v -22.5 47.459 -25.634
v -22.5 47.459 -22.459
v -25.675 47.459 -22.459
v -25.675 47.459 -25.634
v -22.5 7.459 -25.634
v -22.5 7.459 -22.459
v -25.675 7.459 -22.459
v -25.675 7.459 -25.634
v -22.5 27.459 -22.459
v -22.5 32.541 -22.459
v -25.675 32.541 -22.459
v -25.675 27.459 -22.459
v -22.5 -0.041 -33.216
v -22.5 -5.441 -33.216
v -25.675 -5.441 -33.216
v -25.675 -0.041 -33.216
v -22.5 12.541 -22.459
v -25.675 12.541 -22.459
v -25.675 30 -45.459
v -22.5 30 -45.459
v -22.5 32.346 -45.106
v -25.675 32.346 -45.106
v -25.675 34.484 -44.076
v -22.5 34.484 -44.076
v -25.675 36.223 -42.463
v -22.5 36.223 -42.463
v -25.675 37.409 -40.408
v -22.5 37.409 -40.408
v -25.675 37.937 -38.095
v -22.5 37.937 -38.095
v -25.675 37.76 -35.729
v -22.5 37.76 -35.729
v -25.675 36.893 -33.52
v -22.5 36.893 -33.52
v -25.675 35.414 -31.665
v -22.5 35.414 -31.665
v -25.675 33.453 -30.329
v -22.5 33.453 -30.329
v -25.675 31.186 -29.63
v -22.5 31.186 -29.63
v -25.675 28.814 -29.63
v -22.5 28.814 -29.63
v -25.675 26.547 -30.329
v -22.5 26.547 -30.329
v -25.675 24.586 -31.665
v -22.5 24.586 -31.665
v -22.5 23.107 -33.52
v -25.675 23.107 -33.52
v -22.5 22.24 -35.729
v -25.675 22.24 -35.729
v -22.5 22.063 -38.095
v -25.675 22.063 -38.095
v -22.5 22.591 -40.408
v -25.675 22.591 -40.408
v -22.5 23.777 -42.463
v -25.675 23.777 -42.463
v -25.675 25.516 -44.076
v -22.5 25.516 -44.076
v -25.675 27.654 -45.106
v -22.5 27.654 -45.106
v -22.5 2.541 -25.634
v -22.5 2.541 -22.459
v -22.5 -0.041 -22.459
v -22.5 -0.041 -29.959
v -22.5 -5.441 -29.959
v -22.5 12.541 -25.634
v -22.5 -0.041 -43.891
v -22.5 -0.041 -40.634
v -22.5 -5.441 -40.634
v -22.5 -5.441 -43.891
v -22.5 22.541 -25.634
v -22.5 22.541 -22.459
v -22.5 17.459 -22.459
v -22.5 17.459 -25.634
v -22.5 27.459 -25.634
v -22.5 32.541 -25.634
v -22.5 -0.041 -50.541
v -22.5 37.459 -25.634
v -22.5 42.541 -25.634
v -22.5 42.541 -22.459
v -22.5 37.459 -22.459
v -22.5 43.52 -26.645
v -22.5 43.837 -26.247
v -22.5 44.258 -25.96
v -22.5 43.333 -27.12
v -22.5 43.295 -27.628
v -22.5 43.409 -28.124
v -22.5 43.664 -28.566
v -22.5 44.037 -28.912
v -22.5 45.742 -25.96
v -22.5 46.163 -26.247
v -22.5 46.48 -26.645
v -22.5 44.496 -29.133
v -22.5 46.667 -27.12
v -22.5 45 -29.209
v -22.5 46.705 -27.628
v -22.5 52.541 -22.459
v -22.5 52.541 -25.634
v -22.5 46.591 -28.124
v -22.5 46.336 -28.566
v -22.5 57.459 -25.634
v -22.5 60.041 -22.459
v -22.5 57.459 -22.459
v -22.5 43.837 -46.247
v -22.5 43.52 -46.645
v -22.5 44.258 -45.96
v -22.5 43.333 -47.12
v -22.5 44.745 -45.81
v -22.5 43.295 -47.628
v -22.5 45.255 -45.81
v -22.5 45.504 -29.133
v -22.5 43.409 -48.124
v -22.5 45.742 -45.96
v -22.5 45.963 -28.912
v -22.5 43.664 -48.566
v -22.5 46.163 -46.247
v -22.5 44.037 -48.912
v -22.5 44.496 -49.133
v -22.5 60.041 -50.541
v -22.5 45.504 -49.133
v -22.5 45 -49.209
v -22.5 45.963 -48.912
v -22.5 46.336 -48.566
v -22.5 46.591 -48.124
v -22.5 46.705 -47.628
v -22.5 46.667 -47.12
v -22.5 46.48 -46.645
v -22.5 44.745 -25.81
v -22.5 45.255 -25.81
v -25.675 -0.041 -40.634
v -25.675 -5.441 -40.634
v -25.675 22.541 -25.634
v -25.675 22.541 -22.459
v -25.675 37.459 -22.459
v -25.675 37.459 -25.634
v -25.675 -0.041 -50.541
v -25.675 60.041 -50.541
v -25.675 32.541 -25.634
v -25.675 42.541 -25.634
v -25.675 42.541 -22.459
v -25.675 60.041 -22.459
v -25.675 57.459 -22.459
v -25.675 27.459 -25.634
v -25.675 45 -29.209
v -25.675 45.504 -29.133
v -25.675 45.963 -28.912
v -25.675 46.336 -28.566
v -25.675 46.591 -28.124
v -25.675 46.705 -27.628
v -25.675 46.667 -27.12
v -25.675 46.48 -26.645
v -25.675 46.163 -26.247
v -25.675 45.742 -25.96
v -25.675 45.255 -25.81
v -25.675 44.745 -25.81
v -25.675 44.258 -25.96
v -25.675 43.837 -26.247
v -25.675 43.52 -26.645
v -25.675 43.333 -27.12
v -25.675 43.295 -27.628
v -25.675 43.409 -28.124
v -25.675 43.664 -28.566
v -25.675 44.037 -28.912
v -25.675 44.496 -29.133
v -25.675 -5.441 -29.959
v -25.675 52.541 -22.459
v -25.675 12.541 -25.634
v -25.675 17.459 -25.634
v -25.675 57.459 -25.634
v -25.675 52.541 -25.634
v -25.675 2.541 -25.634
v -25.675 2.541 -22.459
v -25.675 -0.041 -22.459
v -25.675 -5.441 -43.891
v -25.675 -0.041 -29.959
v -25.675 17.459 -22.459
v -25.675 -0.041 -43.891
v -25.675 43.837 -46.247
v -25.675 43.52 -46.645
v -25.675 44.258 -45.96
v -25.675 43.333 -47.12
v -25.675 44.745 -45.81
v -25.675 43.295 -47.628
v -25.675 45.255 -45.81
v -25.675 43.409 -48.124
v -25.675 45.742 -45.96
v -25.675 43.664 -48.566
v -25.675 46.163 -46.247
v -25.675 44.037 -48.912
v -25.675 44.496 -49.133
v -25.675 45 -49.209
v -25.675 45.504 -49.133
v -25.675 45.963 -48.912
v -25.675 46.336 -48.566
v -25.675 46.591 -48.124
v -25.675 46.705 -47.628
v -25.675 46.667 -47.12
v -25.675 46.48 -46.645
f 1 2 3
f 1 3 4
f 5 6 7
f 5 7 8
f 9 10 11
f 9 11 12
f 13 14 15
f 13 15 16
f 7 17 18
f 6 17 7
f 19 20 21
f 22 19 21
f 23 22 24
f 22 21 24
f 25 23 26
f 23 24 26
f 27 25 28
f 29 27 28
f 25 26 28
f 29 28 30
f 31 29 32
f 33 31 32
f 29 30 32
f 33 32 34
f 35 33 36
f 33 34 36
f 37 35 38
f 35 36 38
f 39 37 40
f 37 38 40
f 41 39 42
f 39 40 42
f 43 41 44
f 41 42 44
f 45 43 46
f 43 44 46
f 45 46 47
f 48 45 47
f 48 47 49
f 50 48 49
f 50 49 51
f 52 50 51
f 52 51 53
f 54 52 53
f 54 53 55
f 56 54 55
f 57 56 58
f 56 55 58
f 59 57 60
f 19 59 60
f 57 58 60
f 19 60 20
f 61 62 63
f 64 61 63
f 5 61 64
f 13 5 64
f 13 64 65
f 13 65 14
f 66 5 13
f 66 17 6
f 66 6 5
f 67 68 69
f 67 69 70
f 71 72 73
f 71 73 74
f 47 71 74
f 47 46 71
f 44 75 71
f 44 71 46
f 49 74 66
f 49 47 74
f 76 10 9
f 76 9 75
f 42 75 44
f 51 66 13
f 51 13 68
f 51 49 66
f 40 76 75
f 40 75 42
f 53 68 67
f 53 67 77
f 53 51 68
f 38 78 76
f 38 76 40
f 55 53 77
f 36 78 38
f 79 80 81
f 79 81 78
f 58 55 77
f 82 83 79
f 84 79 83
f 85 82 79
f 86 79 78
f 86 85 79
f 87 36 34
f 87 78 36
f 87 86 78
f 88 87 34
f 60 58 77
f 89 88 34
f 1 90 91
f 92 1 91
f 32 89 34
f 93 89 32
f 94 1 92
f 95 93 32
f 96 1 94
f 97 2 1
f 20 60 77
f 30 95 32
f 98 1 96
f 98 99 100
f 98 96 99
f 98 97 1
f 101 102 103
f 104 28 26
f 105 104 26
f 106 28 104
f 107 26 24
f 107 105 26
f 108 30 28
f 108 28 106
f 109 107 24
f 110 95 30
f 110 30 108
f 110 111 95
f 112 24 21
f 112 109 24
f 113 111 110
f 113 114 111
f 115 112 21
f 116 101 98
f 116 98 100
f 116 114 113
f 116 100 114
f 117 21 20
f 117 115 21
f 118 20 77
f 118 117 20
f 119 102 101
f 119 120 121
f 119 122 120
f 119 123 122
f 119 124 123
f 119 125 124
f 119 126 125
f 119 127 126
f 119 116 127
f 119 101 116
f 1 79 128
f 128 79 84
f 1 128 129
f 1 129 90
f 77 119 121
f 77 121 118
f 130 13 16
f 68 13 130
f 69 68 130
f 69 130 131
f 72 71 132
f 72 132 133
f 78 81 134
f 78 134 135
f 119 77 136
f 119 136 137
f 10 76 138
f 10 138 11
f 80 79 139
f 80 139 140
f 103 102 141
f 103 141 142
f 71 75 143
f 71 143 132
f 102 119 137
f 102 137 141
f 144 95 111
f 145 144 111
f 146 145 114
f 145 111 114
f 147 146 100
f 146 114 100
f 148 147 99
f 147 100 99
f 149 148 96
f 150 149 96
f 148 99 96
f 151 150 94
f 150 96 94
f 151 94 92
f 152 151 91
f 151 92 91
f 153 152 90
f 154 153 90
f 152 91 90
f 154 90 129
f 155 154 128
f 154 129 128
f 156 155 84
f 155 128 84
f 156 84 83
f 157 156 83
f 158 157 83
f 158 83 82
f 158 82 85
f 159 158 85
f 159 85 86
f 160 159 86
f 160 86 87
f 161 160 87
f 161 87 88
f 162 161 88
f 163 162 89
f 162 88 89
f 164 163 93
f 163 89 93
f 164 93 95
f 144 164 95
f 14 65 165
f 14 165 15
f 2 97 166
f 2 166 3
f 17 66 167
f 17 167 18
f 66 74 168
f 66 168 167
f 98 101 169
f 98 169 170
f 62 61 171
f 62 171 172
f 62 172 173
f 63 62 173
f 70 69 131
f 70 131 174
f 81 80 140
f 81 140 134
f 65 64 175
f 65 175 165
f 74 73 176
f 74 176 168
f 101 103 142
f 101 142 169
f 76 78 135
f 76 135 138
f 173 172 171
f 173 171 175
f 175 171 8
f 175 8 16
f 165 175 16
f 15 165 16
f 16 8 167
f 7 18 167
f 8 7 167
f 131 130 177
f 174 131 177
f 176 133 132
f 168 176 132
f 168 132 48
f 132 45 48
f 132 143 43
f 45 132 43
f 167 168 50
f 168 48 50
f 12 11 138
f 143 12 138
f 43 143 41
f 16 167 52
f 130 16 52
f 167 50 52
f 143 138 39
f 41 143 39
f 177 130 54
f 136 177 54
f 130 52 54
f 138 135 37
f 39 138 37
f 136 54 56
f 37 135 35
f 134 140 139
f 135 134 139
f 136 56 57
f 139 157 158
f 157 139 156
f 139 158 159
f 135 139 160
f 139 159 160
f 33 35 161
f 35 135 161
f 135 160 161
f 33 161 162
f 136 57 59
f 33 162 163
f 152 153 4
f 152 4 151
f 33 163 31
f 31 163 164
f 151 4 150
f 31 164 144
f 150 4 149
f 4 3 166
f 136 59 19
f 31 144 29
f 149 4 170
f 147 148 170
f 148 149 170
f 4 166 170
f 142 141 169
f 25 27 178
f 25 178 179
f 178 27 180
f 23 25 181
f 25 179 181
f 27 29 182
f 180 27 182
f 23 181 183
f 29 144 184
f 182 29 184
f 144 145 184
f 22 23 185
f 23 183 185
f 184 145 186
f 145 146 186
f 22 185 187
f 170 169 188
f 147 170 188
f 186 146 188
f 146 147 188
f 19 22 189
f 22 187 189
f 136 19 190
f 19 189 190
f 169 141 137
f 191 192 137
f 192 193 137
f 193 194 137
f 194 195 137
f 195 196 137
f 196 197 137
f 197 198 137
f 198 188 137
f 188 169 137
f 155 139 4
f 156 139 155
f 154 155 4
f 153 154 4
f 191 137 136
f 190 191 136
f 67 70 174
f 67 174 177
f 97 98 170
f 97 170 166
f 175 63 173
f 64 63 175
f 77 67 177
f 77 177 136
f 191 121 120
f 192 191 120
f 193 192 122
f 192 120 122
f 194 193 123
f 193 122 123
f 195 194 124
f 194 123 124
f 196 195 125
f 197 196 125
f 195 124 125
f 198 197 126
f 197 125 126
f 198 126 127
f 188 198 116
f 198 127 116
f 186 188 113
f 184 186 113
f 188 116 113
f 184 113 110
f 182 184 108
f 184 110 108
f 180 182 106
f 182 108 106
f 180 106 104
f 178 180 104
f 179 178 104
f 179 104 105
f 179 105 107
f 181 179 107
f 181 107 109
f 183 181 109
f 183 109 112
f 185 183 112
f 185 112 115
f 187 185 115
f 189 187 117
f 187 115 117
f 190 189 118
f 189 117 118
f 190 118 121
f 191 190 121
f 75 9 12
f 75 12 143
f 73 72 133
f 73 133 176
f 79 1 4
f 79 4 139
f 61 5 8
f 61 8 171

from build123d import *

# Parameters (mm, degrees)
SKETCH1_W           = 24.825
SKETCH1_H           = 3.175
SKETCH1_W_2         = 3.175
SKETCH1_H_2         = 24.825
BOSS_EXTRUDE1_DEPTH = 60
SKETCH2_W           = 3.125
SKETCH2_H           = 5.4
BOSS_EXTRUDE4_DEPTH = 3.175
SKETCH4_R           = 8
CUT_EXTRUDE1_DEPTH  = 3.175
SKETCH3_R           = 8
CUT_EXTRUDE2_DEPTH  = 3.175
SKETCH5_W           = 3.175
SKETCH5_H           = 5.4
BOSS_EXTRUDE5_DEPTH = 3.175
SKETCH6_R           = 1.75
CUT_EXTRUDE3_DEPTH  = 10
SKETCH7_R           = 1.75
CUT_EXTRUDE4_DEPTH  = 10
SKETCH9_W           = 3.175
SKETCH9_H           = 65.4
CUT_EXTRUDE5_DEPTH  = 24.825
SKETCH10_W          = 3.175
SKETCH10_H          = 5
CUT_EXTRUDE6_DEPTH  = 10
SKETCH11_R          = 7.95936
SKETCH11_R_2        = 1.70936
BOSS_EXTRUDE6_DEPTH = 3.175


with BuildPart() as part:
    # Sketch1 → Boss-Extrude1 (new body)
    with BuildSketch(Plane(origin=(0, 0, 0), x_dir=(1, 0, 0), z_dir=(0, 1, 0))):
        with Locations((-38.0875, 24.0875)):
            Rectangle(SKETCH1_W, SKETCH1_H)
        with Locations((-24.0875, 24.0875)):
            Rectangle(SKETCH1_W_2, SKETCH1_H)
        with Locations((-24.0875, 38.0875)):
            Rectangle(SKETCH1_W_2, SKETCH1_H_2)
    extrude(amount=BOSS_EXTRUDE1_DEPTH)

    # Sketch2 → Boss-Extrude4 (add)
    with BuildSketch(Plane.XY.offset(-22.5)):
        with Locations((-42.1875, -2.7)):
            Rectangle(SKETCH2_W, SKETCH2_H)
        with Locations((-31.5625, -2.7)):
            Rectangle(SKETCH2_W, SKETCH2_H)
    extrude(amount=-BOSS_EXTRUDE4_DEPTH)

    # Sketch4 → Cut-Extrude1 (cut)
    with BuildSketch(Plane.XY.offset(-22.5)):
        with Locations((-37.5, 30)):
            Circle(SKETCH4_R)
    extrude(amount=-CUT_EXTRUDE1_DEPTH, mode=Mode.SUBTRACT)

    # Sketch3 → Cut-Extrude2 (cut)
    with BuildSketch(Plane(origin=(-22.5, 0, 0), x_dir=(0, 0, -1), z_dir=(1, 0, 0))):
        with Locations((37.5, 30)):
            Circle(SKETCH3_R)
    extrude(amount=-CUT_EXTRUDE2_DEPTH, mode=Mode.SUBTRACT)

    # Sketch5 → Boss-Extrude5 (add)
    with BuildSketch(Plane(origin=(-22.5, 0, 0), x_dir=(0, 0, -1), z_dir=(1, 0, 0))):
        with Locations((42.2625, -2.7)):
            Rectangle(SKETCH5_W, SKETCH5_H)
        with Locations((31.5875, -2.7)):
            Rectangle(SKETCH5_W, SKETCH5_H)
    extrude(amount=-BOSS_EXTRUDE5_DEPTH)

    # Sketch6 → Cut-Extrude3 (cut)
    with BuildSketch(Plane.XY.offset(-22.5)):
        with Locations((-47.5, 45)):
            Circle(SKETCH6_R)
        with Locations((-27.5, 45)):
            Circle(SKETCH6_R)
    extrude(amount=-CUT_EXTRUDE3_DEPTH, mode=Mode.SUBTRACT)

    # Sketch7 → Cut-Extrude4 (cut)
    with BuildSketch(Plane(origin=(-22.5, 0, 0), x_dir=(0, 0, -1), z_dir=(1, 0, 0))):
        with Locations((47.5, 45)):
            Circle(SKETCH7_R)
        with Locations((27.5, 45)):
            Circle(SKETCH7_R)
    extrude(amount=-CUT_EXTRUDE4_DEPTH, mode=Mode.SUBTRACT)

    # Sketch9 → Cut-Extrude5 (cut)
    with BuildSketch(Plane.ZY.offset(50.5)):
        with Locations((-24.0875, 27.3)):
            Rectangle(SKETCH9_W, SKETCH9_H)
    extrude(amount=-CUT_EXTRUDE5_DEPTH, mode=Mode.SUBTRACT)

    # Sketch10 → Cut-Extrude6 (cut)
    with BuildSketch(Plane.ZY.offset(25.675)):
        with Locations((-24.0875, 55)):
            Rectangle(SKETCH10_W, SKETCH10_H)
        with Locations((-24.0875, 45)):
            Rectangle(SKETCH10_W, SKETCH10_H)
        with Locations((-24.0875, 35)):
            Rectangle(SKETCH10_W, SKETCH10_H)
        with Locations((-24.0875, 25)):
            Rectangle(SKETCH10_W, SKETCH10_H)
        with Locations((-24.0875, 15)):
            Rectangle(SKETCH10_W, SKETCH10_H)
        with Locations((-24.0875, 5)):
            Rectangle(SKETCH10_W, SKETCH10_H)
    extrude(amount=-CUT_EXTRUDE6_DEPTH, mode=Mode.SUBTRACT)

    # Sketch11 → Boss-Extrude6 (add)
    with BuildSketch(Plane(origin=(-22.5, 0, 0), x_dir=(0, 0, -1), z_dir=(1, 0, 0))):
        Polygon((25.63436, 57.45936), (25.63436, 52.54064), (22.45936, 52.54064), (22.45936, 47.45936), (25.63436, 47.45936), (25.63436, 42.54064), (22.45936, 42.54064), (22.45936, 37.45936), (25.63436, 37.45936), (25.63436, 32.54064), (22.45936, 32.54064), (22.45936, 27.45936), (25.63436, 27.45936), (25.63436, 22.54064), (22.45936, 22.54064), (22.45936, 17.45936), (25.63436, 17.45936), (25.63436, 12.54064), (22.45936, 12.54064), (22.45936, 7.45936), (25.63436, 7.45936), (25.63436, 2.54064), (22.45936, 2.54064), (22.45936, -0.04064), (29.95936, -0.04064), (29.95936, -5.44064), (33.21564, -5.44064), (33.21564, -0.04064), (40.63436, -0.04064), (40.63436, -5.44064), (43.89064, -5.44064), (43.89064, -0.04064), (50.54064, -0.04064), (50.54064, 60.04064), (22.45936, 60.04064), (22.45936, 57.45936), align=None)
        with Locations((37.5, 30)):
            Circle(SKETCH11_R, mode=Mode.SUBTRACT)
        with Locations((27.5, 45)):
            Circle(SKETCH11_R_2, mode=Mode.SUBTRACT)
        with Locations((47.5, 45)):
            Circle(SKETCH11_R_2, mode=Mode.SUBTRACT)
    extrude(amount=-BOSS_EXTRUDE6_DEPTH)


solid = part.part
